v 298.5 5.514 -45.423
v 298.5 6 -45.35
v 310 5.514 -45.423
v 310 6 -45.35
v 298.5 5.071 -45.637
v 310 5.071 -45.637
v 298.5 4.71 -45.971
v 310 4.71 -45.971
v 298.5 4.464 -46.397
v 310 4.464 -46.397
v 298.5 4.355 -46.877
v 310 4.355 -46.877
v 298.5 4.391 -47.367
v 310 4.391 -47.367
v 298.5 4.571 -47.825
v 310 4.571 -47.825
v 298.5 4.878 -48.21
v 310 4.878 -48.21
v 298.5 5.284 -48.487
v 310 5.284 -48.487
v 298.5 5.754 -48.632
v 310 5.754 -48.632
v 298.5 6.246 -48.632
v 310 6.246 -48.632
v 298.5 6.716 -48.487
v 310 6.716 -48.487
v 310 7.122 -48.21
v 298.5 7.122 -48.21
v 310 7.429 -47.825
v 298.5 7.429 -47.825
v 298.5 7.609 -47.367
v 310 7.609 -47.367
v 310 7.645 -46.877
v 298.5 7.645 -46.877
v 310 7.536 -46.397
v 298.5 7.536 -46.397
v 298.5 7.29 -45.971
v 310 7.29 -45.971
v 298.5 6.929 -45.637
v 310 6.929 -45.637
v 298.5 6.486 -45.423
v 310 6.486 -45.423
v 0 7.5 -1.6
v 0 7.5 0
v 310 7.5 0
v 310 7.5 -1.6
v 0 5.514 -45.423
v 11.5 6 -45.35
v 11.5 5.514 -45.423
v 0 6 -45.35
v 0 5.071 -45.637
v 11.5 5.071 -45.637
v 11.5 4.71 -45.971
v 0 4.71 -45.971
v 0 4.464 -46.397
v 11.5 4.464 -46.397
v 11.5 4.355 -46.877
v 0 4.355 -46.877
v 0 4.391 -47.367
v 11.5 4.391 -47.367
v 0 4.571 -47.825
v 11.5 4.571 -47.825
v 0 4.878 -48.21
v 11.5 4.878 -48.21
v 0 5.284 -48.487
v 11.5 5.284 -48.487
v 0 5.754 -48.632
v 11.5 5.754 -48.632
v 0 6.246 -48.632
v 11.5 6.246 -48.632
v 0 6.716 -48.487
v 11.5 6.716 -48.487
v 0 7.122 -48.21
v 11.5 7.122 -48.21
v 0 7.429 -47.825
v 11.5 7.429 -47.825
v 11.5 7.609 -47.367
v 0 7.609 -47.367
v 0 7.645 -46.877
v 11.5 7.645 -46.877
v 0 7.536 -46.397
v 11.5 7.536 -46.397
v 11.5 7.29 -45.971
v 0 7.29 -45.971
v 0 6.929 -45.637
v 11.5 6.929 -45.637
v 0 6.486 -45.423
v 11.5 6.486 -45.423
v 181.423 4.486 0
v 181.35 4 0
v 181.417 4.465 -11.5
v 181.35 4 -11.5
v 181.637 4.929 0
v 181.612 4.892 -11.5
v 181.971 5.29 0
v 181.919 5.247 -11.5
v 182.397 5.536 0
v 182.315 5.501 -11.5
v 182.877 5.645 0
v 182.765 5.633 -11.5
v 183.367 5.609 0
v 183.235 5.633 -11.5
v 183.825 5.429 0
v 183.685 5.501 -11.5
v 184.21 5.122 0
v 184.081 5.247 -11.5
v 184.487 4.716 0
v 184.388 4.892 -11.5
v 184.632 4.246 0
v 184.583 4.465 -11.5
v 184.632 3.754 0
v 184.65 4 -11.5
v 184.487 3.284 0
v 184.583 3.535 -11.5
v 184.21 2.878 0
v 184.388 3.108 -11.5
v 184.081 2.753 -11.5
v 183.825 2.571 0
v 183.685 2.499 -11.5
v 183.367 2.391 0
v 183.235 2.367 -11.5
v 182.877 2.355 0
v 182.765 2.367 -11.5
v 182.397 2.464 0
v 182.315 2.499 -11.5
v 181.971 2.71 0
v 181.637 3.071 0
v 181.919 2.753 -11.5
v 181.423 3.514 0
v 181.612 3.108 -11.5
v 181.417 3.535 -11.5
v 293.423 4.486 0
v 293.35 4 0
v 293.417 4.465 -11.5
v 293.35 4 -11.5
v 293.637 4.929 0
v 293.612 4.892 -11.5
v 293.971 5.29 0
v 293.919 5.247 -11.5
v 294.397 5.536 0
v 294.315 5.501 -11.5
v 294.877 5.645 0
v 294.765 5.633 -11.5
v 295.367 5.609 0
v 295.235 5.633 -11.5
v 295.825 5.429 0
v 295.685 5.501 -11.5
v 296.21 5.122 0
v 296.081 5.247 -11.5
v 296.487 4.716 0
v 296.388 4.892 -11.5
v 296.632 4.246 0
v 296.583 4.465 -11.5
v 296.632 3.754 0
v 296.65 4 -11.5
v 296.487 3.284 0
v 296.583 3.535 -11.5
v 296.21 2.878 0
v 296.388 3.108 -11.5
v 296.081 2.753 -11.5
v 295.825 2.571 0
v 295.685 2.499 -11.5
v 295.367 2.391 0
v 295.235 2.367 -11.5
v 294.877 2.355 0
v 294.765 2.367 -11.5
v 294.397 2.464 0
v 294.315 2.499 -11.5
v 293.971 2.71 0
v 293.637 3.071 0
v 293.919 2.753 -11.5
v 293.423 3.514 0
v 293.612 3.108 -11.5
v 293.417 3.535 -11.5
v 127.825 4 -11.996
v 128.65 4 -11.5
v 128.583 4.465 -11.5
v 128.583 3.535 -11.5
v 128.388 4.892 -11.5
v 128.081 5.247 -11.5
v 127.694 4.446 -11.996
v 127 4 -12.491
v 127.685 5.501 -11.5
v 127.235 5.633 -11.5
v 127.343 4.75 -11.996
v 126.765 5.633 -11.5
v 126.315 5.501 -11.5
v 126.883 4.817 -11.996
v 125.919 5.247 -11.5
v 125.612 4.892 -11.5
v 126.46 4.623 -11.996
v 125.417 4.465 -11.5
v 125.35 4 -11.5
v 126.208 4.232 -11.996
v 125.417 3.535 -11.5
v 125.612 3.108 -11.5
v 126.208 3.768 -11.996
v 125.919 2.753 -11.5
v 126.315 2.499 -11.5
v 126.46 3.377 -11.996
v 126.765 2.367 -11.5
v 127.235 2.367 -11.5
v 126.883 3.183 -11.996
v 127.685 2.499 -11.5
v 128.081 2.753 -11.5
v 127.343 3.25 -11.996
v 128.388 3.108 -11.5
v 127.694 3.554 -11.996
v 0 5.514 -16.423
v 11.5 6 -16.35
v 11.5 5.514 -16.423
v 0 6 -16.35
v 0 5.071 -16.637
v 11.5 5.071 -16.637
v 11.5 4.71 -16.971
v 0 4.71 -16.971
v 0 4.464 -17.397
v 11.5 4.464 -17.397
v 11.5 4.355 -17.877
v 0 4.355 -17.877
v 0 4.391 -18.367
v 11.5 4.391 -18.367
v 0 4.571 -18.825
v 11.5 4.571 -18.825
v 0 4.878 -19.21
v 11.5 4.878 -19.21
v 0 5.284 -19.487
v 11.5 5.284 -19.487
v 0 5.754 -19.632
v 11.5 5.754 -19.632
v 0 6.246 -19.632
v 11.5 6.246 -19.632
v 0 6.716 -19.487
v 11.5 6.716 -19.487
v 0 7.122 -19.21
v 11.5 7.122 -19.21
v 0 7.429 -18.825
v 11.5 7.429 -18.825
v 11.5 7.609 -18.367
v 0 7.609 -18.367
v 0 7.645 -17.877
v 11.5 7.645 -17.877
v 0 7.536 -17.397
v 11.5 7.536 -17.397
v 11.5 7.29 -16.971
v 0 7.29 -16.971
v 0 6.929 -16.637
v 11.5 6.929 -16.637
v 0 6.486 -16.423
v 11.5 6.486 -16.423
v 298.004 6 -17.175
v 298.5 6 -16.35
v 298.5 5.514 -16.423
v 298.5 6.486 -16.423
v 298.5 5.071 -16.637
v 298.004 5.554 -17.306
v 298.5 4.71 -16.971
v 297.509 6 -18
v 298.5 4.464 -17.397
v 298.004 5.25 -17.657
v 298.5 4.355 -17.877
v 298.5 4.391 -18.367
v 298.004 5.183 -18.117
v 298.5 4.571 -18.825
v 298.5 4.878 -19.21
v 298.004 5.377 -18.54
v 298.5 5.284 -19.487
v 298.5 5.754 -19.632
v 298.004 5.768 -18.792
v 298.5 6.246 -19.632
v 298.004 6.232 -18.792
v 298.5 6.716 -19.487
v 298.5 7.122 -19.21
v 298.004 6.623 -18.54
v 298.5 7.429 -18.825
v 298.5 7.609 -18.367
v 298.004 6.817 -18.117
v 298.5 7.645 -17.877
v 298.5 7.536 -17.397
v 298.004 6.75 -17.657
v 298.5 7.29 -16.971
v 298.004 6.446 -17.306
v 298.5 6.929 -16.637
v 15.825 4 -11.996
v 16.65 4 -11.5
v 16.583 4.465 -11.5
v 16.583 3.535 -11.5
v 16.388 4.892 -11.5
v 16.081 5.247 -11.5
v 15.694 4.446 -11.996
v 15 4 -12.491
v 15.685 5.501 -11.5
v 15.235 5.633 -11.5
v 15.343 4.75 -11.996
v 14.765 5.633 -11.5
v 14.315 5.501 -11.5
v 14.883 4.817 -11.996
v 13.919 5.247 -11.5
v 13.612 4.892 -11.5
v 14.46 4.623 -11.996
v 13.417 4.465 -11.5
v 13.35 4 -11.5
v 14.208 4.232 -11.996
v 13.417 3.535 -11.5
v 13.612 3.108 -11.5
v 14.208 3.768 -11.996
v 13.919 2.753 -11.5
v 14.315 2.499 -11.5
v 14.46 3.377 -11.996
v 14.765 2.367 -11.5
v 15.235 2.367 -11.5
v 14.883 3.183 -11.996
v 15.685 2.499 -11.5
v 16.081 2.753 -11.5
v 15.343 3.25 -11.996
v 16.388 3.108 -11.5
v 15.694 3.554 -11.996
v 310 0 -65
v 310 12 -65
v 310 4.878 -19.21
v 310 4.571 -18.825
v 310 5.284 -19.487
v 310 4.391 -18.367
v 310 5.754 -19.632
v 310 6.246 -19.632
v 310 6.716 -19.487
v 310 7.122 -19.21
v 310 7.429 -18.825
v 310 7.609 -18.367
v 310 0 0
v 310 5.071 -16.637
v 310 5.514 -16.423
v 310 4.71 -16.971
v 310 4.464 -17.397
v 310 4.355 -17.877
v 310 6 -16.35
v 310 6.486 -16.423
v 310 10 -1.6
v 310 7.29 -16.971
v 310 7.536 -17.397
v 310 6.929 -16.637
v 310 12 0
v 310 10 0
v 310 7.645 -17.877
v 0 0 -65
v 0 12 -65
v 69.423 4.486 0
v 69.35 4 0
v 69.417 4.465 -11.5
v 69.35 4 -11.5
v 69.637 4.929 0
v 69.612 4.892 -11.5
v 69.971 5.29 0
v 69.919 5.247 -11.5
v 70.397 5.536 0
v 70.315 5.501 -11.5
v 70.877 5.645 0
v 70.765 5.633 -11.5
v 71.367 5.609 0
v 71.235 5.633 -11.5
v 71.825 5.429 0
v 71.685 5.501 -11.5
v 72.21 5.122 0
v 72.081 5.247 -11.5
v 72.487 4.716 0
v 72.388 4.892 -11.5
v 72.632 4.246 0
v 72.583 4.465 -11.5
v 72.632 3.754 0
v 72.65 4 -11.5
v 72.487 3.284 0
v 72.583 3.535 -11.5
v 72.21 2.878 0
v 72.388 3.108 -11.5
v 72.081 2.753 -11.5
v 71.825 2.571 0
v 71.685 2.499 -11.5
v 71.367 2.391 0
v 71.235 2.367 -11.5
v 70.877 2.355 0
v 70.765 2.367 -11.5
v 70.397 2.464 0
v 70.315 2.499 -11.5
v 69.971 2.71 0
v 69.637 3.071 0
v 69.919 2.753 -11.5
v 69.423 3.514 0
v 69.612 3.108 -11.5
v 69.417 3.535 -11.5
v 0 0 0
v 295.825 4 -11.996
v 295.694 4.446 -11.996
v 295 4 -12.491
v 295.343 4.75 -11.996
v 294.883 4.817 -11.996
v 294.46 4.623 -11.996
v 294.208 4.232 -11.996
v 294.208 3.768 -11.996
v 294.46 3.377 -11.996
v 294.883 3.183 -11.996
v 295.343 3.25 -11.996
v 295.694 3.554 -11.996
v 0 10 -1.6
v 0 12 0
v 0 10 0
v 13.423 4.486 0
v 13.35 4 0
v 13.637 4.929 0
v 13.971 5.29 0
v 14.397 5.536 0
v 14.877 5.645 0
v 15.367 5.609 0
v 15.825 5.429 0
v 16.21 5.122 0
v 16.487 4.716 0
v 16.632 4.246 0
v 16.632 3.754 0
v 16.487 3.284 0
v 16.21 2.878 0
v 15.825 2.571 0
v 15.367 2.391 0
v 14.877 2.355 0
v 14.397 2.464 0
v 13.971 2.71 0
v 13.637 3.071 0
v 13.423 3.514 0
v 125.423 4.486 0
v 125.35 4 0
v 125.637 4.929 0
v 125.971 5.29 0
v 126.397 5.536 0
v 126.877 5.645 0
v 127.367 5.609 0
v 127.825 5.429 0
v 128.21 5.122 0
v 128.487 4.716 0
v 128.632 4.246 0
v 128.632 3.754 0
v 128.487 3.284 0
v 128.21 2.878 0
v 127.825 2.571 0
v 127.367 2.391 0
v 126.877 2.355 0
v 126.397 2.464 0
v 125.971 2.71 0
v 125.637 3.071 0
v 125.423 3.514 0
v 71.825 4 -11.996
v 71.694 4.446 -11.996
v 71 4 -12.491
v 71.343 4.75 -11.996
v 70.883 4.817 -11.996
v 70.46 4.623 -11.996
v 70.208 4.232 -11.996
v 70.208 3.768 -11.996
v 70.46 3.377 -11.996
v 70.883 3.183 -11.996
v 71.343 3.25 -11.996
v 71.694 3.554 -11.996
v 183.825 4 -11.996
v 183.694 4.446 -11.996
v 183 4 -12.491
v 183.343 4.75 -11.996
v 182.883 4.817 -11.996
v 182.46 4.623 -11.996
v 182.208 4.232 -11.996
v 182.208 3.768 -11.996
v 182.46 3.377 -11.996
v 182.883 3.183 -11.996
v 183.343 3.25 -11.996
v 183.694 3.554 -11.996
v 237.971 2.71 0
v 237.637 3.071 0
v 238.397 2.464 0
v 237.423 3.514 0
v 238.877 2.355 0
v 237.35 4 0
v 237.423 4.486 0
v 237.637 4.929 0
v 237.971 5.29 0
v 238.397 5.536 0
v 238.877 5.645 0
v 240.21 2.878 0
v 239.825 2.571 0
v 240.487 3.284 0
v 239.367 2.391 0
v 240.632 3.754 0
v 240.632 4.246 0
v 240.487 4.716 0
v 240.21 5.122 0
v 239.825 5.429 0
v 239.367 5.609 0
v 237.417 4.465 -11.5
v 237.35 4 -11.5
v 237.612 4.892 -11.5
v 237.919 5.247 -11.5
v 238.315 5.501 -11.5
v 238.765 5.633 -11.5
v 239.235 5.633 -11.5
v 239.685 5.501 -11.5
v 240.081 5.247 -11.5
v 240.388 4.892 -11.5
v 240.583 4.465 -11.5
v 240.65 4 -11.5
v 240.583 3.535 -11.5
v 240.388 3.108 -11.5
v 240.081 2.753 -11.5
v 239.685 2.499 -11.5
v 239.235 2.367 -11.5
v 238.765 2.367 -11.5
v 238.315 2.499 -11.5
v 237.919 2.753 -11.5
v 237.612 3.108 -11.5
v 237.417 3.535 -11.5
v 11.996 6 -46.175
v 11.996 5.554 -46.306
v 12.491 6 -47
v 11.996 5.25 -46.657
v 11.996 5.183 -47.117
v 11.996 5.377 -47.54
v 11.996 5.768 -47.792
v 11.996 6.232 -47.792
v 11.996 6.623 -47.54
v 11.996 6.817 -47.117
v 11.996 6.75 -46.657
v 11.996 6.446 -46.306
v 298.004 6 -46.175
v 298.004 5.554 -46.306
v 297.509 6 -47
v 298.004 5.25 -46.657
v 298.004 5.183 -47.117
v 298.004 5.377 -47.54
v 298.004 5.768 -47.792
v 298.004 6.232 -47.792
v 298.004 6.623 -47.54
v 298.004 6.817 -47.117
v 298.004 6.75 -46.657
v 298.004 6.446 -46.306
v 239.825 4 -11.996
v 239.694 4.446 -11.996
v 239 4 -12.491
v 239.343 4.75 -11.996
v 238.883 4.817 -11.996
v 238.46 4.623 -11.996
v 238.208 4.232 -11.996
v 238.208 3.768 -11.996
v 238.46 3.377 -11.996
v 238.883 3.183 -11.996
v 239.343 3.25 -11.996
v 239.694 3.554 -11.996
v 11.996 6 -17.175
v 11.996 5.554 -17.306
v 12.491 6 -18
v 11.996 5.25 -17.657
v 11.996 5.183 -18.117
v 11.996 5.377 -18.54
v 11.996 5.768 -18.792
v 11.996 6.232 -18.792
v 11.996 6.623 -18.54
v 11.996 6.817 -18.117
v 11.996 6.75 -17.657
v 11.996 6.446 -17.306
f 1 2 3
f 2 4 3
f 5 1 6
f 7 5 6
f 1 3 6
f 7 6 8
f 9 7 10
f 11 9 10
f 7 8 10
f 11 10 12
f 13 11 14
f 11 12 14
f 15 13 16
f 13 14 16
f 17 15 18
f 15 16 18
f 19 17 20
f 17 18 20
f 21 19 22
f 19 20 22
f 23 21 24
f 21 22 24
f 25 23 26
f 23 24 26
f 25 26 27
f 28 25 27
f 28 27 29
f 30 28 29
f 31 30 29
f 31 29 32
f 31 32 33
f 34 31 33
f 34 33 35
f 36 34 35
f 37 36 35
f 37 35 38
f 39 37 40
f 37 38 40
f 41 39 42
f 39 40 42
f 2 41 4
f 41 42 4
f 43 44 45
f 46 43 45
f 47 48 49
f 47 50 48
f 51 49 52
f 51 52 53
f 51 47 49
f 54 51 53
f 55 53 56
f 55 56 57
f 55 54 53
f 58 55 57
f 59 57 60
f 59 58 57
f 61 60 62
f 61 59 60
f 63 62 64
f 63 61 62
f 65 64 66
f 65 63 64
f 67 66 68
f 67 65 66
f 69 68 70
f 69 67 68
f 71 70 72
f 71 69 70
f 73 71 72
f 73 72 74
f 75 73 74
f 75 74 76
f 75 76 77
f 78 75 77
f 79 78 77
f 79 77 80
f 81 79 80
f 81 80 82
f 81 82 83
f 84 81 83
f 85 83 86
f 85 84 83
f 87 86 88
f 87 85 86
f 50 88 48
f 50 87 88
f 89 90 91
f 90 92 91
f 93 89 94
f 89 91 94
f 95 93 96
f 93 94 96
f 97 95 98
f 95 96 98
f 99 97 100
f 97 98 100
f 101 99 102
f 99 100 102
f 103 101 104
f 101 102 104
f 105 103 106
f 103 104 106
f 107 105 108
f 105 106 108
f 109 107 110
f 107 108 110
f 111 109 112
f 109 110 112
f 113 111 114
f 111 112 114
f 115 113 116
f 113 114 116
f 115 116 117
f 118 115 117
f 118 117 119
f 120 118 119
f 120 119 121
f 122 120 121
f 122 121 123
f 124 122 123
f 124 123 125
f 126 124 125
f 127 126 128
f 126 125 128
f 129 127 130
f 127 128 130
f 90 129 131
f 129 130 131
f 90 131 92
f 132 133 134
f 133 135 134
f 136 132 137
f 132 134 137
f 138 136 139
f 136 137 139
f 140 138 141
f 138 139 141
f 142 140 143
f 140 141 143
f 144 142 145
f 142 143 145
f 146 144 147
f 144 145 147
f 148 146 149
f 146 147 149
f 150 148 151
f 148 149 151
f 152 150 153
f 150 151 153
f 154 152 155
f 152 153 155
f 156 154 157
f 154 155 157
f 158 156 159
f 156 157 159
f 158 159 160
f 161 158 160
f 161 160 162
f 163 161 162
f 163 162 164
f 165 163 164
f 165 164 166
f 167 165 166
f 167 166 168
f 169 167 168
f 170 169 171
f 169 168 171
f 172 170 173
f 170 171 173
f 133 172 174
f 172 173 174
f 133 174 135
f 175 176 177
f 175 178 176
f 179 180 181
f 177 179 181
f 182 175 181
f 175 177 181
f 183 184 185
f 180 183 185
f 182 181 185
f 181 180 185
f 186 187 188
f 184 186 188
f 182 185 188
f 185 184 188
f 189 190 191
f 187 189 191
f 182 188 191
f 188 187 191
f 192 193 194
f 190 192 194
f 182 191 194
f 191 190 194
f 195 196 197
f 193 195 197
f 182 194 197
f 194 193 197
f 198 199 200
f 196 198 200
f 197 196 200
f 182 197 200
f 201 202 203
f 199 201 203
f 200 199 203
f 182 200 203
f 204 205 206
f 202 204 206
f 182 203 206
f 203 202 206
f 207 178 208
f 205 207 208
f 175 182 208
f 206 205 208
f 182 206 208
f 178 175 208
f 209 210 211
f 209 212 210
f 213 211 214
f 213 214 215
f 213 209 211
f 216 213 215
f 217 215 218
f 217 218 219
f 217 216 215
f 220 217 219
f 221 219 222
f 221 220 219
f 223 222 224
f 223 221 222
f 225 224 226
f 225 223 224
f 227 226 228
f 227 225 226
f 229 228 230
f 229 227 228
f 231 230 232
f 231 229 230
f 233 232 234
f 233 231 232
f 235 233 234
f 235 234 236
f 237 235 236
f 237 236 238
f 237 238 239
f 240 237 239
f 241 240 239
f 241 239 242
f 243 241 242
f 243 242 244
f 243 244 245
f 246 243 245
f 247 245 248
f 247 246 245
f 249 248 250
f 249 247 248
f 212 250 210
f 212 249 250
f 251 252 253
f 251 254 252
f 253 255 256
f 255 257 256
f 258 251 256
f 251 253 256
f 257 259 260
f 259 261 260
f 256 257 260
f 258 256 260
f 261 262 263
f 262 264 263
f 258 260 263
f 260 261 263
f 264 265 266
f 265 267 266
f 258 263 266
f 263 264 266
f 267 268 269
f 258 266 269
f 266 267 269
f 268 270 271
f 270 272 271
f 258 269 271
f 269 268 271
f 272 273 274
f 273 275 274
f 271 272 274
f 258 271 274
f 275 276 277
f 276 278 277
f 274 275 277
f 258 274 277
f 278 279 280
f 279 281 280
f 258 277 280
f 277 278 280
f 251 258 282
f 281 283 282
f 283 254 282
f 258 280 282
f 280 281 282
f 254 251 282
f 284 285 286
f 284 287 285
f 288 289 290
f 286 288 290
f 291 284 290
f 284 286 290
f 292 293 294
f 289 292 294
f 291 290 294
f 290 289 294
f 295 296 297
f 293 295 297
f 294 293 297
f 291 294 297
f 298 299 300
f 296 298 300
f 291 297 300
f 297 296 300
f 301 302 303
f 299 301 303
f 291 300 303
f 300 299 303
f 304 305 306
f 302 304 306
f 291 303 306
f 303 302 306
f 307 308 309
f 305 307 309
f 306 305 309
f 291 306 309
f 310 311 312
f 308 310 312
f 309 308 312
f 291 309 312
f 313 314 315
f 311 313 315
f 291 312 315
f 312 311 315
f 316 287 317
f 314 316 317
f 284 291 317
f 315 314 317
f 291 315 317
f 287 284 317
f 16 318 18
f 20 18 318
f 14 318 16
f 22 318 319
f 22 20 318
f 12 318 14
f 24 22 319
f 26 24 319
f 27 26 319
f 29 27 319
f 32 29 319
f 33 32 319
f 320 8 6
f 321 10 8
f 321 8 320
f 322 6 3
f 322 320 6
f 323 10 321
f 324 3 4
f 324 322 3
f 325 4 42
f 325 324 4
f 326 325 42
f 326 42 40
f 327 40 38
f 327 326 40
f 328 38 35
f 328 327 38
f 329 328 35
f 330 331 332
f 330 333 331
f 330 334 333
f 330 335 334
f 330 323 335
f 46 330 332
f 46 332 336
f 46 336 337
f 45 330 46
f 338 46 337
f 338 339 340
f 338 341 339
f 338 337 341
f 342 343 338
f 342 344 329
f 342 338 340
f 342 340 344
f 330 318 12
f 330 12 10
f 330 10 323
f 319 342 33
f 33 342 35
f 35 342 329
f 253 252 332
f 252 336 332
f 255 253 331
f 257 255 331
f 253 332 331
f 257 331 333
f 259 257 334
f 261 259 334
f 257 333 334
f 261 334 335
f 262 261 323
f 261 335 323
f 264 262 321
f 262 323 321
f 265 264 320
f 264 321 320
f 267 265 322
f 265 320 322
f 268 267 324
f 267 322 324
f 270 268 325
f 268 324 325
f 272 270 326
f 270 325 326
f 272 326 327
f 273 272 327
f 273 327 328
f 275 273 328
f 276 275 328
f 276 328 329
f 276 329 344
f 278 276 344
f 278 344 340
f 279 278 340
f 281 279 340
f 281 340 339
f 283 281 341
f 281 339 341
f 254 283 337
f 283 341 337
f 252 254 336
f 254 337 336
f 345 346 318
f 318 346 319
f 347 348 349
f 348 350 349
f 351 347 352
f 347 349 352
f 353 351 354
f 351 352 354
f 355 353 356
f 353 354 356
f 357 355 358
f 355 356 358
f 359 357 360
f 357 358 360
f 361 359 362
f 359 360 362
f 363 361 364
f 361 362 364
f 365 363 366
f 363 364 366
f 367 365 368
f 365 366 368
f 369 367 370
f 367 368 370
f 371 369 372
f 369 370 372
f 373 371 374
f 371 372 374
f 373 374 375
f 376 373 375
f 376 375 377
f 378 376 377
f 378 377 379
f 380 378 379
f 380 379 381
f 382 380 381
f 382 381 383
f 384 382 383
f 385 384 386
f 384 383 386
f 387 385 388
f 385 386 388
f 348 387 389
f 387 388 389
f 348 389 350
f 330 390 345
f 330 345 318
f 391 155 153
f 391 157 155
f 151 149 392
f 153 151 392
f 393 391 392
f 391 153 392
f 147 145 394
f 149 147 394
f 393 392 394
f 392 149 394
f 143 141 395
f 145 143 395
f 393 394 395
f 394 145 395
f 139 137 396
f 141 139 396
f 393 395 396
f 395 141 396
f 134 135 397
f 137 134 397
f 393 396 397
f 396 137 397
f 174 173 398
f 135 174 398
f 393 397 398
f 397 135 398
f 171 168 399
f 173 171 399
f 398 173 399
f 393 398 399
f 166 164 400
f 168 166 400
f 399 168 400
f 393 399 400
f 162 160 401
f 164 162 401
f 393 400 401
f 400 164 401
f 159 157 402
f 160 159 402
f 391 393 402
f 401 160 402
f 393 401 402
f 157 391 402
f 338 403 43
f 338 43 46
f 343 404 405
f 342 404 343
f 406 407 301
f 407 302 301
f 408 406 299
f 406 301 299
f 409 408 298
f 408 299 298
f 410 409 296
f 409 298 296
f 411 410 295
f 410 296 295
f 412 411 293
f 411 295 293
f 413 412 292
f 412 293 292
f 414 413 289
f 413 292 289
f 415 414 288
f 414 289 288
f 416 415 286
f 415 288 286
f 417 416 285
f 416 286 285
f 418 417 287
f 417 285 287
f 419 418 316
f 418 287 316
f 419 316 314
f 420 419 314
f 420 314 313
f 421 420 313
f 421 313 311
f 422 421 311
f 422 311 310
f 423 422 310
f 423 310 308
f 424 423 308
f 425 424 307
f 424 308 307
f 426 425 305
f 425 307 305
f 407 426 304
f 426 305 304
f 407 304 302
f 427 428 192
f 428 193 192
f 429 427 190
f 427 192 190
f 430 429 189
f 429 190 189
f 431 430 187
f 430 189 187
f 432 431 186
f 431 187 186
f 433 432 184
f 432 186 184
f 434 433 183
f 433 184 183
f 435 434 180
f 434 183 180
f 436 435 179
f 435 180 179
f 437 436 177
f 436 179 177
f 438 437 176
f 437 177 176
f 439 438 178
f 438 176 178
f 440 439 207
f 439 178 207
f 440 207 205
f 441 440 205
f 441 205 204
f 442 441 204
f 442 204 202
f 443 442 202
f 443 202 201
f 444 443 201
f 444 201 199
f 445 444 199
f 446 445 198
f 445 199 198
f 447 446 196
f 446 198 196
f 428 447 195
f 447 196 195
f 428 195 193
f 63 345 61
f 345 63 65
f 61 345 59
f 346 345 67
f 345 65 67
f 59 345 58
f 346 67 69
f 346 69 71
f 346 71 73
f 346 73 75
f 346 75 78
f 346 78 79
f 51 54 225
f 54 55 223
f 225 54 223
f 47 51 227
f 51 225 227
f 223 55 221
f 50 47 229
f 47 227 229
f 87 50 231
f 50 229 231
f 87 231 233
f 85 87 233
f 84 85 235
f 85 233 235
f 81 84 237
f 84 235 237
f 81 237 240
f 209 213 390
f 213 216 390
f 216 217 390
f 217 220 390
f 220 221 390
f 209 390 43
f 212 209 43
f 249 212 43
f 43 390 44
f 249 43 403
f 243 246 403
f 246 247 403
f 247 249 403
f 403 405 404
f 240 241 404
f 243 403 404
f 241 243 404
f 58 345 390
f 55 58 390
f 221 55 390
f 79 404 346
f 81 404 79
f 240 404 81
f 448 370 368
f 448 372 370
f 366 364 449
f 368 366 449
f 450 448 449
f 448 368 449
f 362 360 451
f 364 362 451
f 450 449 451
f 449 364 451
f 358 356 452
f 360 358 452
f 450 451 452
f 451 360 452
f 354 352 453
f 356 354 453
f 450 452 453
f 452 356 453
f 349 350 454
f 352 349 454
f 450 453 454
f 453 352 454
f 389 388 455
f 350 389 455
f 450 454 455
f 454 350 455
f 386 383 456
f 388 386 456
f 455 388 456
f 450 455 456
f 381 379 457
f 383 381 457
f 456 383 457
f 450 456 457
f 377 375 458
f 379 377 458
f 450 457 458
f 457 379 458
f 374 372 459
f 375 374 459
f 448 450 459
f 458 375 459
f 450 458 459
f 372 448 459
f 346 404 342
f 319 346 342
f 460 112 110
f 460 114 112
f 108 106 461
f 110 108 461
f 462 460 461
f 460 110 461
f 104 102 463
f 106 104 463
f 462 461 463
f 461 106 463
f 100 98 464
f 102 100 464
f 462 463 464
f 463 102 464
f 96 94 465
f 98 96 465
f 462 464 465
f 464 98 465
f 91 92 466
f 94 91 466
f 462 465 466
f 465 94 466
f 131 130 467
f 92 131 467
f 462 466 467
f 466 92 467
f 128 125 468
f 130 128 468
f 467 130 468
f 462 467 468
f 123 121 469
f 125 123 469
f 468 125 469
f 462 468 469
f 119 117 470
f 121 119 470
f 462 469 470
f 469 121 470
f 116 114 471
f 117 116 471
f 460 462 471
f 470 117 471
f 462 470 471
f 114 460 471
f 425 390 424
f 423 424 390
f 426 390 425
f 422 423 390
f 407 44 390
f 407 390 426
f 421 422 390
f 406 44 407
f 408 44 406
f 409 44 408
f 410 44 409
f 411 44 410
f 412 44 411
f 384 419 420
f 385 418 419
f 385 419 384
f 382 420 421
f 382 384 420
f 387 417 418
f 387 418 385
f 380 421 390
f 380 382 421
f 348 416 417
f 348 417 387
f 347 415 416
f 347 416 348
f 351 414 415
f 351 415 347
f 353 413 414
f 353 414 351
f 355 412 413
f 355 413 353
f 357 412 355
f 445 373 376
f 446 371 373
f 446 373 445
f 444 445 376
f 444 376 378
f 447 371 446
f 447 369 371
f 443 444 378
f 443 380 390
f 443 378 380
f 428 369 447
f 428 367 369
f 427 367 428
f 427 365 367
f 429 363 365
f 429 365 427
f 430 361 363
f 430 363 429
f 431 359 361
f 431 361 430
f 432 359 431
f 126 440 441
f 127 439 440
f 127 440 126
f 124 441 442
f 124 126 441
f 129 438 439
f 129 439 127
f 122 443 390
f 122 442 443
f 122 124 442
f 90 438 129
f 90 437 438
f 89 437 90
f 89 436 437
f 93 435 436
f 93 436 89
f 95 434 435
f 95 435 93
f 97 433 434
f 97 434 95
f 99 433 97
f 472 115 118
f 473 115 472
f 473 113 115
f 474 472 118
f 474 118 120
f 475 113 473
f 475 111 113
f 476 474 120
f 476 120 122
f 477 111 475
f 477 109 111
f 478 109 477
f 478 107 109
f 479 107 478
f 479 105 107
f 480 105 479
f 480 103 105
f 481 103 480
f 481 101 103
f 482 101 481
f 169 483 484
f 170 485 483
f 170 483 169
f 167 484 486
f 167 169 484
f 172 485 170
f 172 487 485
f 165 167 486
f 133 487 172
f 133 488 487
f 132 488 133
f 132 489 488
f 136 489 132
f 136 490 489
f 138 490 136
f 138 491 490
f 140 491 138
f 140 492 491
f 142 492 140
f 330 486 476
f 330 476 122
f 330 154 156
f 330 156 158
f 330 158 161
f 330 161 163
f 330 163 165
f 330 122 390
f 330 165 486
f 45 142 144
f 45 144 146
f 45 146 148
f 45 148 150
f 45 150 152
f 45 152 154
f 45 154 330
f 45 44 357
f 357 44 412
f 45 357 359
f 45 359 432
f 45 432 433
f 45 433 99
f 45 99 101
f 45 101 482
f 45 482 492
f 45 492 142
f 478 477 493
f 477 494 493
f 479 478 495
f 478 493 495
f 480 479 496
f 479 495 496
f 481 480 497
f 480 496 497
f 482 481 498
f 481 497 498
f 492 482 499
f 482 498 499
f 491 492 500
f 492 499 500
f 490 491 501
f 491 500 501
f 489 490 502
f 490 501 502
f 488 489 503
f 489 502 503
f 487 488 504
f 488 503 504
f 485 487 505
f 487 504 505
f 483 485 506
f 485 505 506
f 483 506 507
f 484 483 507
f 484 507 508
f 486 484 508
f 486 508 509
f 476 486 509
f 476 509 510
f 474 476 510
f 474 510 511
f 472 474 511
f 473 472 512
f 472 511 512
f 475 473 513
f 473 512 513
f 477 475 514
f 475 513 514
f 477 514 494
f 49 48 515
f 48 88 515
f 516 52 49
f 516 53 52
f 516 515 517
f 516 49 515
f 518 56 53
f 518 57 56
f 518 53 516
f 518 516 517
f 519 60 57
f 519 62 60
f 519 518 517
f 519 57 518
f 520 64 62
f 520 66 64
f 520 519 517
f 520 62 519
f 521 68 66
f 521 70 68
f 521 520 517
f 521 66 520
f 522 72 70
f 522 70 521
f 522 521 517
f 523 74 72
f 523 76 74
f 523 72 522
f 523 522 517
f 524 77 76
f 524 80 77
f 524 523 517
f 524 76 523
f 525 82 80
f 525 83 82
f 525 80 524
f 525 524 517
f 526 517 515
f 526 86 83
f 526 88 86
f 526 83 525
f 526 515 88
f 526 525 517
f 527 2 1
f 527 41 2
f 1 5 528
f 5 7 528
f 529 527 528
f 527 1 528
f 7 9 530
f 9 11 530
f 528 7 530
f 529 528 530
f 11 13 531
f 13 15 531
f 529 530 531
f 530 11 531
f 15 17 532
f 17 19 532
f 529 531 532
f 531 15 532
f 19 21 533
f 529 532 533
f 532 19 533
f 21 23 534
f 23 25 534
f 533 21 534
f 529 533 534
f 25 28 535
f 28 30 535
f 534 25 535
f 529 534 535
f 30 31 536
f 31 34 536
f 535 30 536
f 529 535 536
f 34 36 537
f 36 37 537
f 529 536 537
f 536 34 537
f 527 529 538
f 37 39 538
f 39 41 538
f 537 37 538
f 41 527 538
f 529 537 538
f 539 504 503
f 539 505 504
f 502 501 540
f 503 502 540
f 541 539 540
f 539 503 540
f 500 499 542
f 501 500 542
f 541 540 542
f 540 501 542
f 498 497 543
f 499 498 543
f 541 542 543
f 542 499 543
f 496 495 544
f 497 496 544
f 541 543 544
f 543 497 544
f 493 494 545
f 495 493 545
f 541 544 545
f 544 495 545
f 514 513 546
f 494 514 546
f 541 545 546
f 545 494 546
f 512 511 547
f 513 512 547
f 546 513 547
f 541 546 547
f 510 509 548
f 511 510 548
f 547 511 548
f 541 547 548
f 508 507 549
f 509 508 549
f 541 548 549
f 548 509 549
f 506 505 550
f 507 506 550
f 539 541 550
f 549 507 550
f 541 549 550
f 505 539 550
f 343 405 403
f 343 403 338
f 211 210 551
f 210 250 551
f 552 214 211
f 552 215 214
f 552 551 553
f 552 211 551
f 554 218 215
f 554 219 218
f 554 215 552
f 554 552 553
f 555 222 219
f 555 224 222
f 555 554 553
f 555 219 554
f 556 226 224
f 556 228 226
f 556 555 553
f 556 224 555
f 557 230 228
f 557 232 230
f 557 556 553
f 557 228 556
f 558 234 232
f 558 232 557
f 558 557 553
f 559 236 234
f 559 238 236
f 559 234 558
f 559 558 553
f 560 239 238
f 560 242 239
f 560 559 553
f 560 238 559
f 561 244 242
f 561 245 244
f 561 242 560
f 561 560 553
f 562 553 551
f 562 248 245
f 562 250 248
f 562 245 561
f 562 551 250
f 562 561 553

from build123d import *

# Parameters (mm, degrees)
SKIZZE1_W                       = 310
SKIZZE1_H                       = 12
AUFSATZ_LINEAR_AUSTRAGEN1_DEPTH = 65
SKIZZE2_W                       = 310
SKIZZE2_H                       = 2.5
SCHNITT_LINEAR_AUSTRAGEN1_DEPTH = 1.6
M4_GEWINDEBOHRUNG1_D            = 3.3
M4_GEWINDEBOHRUNG1_DEPTH        = 11.5
M4_GEWINDEBOHRUNG1_TIP          = 0.991420021
M4_GEWINDEBOHRUNG2_AT_2_COUNT   = 2
M4_GEWINDEBOHRUNG2_AT_2_PITCH   = 29


with BuildPart() as part:
    # Skizze1 → Aufsatz-Linear austragen1 (new body)
    with BuildSketch(Plane.XY):
        with Locations((155, 6)):
            Rectangle(SKIZZE1_W, SKIZZE1_H)
    extrude(amount=-AUFSATZ_LINEAR_AUSTRAGEN1_DEPTH)

    # Skizze2 → Schnitt-Linear austragen1 (cut)
    with BuildSketch(Plane.XY):
        with Locations((155, 8.75)):
            Rectangle(SKIZZE2_W, SKIZZE2_H)
    extrude(amount=-SCHNITT_LINEAR_AUSTRAGEN1_DEPTH, mode=Mode.SUBTRACT)

    # M4 Gewindebohrung1
    with Locations(Plane(origin=(295, 4, 0), x_dir=(1, 0, 0), z_dir=(0, 0, 1))):
        with Locations((0, 0), (-280, 0), (-224, 0), (-168, 0), (-112, 0), (-56, 0)):
            Hole(M4_GEWINDEBOHRUNG1_D / 2, depth=M4_GEWINDEBOHRUNG1_DEPTH)
            with Locations((0, 0, -(M4_GEWINDEBOHRUNG1_DEPTH + M4_GEWINDEBOHRUNG1_TIP / 2))):  # 118° drill point
                Cone(0, M4_GEWINDEBOHRUNG1_D / 2, M4_GEWINDEBOHRUNG1_TIP, mode=Mode.SUBTRACT)

    # Skizze4 → M4 Gewindebohrung2 (revolve, cut)
    with BuildSketch(Plane(origin=(0, 6, -18), x_dir=(0, 0, 1), z_dir=(0, 1, 0))):
        Polygon((0, 0), (0, 12.491420021), (1.65, 11.5), (1.65, 0), align=None)
    m4_gewindebohrung2 = revolve(axis=Axis((-6.35, 6, -18), (1, 0, 0)), mode=Mode.SUBTRACT)

    # M4 Gewindebohrung2 at 2: M4 Gewindebohrung2 ×2
    with Locations(*[(0, 0, -i * M4_GEWINDEBOHRUNG2_AT_2_PITCH) for i in range(1, M4_GEWINDEBOHRUNG2_AT_2_COUNT)]):
        add(m4_gewindebohrung2, mode=Mode.SUBTRACT)

    # Spiegeln2: M4 Gewindebohrung2 across plane
    add(m4_gewindebohrung2.mirror(Plane(origin=(155, 0, 0), x_dir=(0, 0, 1), z_dir=(1, 0, 0))), mode=Mode.SUBTRACT)

    # Spiegeln2 copy 1 sketch → Spiegeln2 copy 1 (revolve, cut)
    with BuildSketch(Plane(origin=(310, 6, -47), x_dir=(0, 0, 1), z_dir=(0, 1, 0))):
        Polygon((0, 0), (0, -12.491420021), (1.65, -11.5), (1.65, 0), align=None)
    revolve(axis=Axis((316.35, 6, -47), (1, 0, 0)), mode=Mode.SUBTRACT)


solid = part.part
